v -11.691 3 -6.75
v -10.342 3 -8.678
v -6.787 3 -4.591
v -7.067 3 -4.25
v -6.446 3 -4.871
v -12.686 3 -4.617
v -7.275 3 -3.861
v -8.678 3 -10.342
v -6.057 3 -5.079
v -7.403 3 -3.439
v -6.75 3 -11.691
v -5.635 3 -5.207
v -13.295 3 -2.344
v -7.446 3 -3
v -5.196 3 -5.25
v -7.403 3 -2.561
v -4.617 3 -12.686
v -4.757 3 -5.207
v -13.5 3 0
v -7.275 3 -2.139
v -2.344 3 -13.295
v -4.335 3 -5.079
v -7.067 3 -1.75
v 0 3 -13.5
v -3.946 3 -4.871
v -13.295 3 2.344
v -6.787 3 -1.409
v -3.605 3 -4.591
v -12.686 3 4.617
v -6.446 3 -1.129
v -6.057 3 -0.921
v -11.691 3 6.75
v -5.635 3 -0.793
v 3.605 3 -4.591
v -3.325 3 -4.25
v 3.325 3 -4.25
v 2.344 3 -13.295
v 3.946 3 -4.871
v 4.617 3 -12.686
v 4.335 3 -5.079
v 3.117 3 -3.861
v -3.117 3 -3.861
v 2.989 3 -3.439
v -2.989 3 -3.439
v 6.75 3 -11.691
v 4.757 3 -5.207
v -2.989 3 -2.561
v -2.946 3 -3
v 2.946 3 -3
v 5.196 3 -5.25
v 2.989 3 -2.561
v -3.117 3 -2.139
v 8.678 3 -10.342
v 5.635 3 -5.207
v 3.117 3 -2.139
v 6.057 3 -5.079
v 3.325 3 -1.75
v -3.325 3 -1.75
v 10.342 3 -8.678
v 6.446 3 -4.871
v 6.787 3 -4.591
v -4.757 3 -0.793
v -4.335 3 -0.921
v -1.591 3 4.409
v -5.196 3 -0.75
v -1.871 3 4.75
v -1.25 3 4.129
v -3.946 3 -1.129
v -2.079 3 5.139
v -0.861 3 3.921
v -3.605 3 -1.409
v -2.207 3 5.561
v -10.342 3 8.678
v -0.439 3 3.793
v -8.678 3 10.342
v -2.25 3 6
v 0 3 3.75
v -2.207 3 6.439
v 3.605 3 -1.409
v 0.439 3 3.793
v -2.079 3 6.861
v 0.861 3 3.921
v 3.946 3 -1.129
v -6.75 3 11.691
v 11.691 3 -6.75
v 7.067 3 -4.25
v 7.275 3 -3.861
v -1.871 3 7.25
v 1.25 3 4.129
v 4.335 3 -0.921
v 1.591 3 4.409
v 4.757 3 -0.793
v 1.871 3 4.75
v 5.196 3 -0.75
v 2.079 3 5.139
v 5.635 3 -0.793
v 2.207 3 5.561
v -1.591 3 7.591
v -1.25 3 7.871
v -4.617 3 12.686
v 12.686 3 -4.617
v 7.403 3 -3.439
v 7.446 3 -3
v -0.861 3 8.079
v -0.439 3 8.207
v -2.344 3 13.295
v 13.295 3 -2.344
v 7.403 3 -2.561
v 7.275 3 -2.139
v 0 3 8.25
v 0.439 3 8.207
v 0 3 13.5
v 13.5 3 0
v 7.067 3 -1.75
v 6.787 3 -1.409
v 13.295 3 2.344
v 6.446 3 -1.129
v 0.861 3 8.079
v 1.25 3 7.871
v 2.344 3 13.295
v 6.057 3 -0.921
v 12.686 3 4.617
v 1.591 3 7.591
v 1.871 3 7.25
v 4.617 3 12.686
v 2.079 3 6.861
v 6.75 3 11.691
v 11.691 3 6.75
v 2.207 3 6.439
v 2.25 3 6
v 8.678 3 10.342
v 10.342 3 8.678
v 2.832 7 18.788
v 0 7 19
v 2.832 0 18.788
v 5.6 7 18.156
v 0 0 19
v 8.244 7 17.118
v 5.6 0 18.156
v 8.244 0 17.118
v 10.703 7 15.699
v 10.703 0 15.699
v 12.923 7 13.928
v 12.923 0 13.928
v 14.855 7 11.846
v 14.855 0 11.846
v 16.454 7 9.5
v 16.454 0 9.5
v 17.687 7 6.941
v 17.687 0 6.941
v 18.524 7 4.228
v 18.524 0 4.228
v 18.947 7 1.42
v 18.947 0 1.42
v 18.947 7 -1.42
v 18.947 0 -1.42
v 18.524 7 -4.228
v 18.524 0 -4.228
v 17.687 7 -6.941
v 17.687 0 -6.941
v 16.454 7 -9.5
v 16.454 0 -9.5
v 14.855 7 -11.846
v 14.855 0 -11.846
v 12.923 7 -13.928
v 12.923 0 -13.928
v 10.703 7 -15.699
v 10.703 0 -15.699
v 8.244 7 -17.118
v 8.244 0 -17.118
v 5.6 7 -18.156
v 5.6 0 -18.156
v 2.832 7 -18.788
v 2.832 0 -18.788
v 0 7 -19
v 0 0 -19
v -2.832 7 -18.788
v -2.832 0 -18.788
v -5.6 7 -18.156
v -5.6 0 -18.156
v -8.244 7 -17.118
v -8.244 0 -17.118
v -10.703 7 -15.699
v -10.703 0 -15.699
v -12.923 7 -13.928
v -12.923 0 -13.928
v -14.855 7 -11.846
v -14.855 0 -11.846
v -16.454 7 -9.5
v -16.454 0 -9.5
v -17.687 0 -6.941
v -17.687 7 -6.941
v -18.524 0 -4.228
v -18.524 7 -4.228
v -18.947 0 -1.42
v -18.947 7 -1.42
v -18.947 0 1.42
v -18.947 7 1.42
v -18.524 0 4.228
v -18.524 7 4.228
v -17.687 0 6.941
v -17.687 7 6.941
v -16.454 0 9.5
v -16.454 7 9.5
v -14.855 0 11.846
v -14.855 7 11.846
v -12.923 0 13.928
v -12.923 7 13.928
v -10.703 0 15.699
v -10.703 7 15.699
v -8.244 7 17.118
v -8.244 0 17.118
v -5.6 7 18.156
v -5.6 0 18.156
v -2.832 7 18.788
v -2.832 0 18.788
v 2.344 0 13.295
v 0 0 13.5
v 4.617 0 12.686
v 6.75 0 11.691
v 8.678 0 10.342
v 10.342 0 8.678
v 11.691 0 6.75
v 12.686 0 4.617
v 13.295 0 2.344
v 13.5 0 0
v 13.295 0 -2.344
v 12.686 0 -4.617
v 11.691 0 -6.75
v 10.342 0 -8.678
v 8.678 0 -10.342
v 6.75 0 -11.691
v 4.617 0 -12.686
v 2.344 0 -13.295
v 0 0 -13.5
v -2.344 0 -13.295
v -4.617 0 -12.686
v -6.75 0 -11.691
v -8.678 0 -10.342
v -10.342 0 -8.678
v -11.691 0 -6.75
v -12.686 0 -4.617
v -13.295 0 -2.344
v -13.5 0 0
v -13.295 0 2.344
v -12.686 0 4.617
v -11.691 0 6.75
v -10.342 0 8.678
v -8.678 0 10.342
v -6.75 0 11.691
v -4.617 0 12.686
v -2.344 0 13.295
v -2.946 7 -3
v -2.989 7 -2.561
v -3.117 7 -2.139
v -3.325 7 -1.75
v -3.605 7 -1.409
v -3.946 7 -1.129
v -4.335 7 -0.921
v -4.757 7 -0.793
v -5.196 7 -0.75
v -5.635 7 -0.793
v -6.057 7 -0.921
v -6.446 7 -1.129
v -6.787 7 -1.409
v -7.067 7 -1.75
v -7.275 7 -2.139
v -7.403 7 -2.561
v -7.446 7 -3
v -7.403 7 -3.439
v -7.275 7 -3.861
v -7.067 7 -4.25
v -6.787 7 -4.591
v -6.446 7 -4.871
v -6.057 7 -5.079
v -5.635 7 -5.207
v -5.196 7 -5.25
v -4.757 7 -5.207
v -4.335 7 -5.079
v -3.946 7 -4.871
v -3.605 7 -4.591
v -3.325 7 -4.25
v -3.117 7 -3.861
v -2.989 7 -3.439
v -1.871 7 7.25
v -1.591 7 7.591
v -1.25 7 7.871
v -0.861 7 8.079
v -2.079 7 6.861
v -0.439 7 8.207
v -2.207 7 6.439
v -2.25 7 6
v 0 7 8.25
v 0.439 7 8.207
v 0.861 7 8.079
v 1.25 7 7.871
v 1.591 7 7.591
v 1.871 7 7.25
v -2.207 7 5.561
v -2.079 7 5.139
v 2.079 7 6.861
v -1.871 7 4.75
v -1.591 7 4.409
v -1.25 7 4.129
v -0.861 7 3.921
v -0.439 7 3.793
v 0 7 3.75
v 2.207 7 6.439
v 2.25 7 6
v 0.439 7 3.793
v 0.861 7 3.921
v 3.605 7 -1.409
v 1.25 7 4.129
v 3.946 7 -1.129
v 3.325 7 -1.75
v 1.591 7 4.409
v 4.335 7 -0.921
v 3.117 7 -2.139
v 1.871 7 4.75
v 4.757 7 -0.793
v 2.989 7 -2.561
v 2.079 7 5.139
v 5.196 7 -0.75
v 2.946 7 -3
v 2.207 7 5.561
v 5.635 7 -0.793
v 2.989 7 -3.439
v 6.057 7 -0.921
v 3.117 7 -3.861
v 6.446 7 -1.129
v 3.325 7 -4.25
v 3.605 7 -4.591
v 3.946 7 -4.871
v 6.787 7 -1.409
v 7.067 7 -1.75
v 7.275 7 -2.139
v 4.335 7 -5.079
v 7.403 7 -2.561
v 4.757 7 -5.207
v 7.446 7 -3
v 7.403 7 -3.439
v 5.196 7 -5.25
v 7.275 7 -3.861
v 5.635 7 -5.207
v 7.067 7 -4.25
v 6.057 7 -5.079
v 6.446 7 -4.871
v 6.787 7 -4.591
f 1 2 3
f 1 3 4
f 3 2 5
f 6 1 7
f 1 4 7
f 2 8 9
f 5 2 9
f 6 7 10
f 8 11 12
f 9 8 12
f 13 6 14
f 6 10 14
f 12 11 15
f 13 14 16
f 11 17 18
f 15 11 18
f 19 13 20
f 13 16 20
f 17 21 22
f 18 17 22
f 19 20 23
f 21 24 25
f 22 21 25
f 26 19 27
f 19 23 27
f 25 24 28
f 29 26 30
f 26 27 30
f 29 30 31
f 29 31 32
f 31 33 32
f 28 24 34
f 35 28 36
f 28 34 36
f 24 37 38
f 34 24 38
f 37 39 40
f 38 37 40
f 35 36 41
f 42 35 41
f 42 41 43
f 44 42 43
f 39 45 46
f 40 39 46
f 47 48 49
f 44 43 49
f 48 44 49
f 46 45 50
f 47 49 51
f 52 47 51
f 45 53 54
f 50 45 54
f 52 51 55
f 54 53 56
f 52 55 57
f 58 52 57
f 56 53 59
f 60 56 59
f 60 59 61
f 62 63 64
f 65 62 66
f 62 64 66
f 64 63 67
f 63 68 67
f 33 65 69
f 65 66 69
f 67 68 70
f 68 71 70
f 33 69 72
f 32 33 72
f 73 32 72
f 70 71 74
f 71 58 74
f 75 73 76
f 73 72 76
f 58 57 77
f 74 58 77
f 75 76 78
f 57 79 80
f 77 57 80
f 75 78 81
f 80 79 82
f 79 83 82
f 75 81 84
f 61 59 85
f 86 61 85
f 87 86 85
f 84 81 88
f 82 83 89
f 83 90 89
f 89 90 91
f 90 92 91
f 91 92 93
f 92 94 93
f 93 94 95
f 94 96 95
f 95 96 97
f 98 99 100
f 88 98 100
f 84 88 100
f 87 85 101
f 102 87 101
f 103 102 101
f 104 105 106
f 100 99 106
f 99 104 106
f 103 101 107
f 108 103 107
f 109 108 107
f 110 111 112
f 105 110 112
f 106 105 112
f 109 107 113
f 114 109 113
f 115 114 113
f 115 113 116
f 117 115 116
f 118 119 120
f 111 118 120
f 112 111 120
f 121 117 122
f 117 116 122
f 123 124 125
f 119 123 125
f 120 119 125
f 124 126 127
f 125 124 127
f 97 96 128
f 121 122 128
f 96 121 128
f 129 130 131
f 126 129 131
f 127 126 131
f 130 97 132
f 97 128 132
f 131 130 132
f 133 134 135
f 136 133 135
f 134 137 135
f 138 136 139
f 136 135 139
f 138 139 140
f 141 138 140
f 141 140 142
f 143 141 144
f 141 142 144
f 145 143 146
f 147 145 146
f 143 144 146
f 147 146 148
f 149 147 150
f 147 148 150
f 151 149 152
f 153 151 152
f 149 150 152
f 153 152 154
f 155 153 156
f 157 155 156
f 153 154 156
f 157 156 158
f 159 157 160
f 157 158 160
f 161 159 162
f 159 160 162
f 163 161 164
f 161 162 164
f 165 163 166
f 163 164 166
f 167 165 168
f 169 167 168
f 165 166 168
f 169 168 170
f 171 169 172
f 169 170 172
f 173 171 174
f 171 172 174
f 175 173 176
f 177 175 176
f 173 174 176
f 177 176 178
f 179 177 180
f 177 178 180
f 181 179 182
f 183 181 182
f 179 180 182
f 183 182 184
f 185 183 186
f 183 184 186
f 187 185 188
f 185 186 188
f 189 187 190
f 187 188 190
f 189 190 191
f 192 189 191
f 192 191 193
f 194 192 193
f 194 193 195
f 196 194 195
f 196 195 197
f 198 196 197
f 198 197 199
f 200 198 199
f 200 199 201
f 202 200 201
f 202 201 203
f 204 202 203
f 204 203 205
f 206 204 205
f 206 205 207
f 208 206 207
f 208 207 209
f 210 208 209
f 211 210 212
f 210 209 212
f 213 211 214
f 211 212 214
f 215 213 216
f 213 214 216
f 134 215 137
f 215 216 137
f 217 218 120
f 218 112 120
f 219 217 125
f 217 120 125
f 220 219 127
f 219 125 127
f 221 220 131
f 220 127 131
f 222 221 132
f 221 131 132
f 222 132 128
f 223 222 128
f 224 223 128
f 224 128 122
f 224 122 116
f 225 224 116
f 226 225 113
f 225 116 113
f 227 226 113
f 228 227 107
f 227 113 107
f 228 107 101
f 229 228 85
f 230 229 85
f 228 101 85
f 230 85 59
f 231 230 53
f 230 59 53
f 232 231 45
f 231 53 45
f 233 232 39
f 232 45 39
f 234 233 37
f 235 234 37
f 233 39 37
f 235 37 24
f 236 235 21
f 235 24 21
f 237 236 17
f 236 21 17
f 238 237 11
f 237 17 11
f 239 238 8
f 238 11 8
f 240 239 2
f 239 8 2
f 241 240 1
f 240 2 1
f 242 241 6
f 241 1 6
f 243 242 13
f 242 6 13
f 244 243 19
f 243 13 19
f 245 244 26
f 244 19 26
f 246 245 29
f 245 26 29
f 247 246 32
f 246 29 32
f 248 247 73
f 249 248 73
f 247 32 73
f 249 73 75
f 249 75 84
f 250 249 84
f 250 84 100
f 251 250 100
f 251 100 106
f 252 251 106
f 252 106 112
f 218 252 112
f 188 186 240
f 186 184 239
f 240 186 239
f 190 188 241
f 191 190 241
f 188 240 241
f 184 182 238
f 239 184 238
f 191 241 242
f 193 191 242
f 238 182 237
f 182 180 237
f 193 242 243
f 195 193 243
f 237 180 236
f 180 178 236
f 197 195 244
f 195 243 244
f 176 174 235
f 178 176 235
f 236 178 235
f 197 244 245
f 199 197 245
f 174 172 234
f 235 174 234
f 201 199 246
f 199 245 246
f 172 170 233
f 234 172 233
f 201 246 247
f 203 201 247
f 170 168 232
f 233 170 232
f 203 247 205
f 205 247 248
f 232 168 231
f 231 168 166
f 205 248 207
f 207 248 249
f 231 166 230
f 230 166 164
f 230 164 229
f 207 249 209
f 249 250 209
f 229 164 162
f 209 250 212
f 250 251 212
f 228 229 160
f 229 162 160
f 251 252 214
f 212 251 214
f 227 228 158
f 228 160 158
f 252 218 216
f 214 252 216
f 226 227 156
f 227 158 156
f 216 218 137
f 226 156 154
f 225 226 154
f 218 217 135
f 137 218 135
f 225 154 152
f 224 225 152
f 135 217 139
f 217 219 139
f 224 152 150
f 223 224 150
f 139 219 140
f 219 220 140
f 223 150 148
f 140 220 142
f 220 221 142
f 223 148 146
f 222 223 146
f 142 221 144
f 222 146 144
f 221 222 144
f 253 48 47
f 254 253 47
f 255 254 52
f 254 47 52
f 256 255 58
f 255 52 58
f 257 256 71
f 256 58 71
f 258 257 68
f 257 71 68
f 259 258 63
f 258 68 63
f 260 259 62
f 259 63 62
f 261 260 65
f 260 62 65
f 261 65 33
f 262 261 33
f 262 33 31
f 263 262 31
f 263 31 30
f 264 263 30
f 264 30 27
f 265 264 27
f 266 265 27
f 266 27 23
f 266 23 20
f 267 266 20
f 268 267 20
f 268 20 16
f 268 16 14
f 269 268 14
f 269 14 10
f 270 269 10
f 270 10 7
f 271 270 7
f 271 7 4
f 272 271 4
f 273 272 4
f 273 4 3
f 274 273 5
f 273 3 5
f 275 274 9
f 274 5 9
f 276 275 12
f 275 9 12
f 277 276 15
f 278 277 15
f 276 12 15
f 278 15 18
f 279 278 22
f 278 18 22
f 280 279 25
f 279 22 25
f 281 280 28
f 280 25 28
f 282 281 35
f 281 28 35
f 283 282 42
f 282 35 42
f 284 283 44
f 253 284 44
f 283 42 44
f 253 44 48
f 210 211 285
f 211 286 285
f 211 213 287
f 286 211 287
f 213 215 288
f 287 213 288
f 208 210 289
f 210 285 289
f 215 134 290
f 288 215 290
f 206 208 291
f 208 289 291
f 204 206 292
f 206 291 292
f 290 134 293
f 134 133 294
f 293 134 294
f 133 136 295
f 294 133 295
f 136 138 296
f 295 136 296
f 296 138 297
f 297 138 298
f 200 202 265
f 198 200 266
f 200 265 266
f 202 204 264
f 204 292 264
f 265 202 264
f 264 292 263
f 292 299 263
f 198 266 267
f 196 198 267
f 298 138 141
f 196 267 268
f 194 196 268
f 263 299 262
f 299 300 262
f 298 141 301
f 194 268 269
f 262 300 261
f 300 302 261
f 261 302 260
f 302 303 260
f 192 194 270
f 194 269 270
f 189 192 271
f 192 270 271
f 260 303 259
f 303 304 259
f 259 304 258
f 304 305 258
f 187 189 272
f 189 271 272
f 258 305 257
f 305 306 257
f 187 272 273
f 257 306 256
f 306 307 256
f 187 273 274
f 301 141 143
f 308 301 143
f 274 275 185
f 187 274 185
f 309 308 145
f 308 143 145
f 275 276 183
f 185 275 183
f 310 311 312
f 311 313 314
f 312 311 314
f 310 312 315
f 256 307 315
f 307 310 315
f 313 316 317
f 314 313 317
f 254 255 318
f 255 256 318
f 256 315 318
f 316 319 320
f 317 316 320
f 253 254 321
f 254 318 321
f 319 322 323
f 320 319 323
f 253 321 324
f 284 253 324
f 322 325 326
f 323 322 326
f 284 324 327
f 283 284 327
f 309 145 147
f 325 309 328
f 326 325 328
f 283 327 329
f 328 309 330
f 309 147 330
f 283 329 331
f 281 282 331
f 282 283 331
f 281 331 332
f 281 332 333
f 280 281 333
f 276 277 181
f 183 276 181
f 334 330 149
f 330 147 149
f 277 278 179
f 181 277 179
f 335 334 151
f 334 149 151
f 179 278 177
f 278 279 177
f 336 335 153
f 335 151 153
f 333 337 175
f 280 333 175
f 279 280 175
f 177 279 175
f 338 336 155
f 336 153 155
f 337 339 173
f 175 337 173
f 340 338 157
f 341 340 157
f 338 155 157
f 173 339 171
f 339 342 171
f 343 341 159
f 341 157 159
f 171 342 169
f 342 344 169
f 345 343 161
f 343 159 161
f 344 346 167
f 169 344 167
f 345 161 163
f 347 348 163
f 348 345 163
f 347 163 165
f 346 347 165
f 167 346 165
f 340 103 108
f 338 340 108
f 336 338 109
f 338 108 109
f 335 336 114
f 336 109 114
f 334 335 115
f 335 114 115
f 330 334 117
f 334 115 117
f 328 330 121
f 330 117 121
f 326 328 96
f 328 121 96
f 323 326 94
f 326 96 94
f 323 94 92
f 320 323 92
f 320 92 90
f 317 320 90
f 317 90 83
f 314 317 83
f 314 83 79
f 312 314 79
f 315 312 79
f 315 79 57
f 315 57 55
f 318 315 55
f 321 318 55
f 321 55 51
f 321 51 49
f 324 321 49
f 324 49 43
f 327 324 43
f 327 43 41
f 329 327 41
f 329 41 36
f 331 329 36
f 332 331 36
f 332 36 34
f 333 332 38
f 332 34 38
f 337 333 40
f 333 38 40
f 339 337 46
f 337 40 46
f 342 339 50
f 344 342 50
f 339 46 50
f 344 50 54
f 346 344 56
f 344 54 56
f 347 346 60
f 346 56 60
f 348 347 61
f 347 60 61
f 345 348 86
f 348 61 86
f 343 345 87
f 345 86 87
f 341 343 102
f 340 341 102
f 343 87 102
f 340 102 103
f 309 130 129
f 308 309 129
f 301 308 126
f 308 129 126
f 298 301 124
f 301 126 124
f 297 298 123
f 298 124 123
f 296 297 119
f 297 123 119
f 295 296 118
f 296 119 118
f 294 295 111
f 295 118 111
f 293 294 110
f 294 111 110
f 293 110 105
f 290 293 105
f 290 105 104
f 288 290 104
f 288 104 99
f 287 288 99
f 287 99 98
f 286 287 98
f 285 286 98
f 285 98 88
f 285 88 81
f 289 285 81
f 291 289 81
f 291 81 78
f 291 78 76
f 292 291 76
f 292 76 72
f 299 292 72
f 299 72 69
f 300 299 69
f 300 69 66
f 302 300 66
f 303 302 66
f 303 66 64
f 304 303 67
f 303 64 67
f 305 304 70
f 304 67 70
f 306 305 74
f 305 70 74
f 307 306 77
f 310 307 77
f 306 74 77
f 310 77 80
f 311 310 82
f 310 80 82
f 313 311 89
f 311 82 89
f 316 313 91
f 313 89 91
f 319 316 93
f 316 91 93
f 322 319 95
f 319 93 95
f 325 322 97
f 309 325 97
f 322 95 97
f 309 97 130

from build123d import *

# Parameters (mm, degrees)
F3_D = 4.5


with BuildPart() as f1:
    # F0 (on Right) → F1 (revolve)
    with BuildSketch(Plane.YZ):
        Polygon((7, 19), (0, 19), (0, 13.5), (3, 13.5), (3, 0), (7, 0), align=None)
    revolve(axis=Axis((0, 5, 0), (0, 1, 0)))

    # F3 (through all)
    with Locations(Plane(origin=(0, 7, 0), x_dir=(-1, 0, 0), z_dir=(0, 1, 0))):
        with Locations((0, 6), (-5.196152, -3), (5.196152, -3)):
            Hole(F3_D / 2)


solid = f1.part
